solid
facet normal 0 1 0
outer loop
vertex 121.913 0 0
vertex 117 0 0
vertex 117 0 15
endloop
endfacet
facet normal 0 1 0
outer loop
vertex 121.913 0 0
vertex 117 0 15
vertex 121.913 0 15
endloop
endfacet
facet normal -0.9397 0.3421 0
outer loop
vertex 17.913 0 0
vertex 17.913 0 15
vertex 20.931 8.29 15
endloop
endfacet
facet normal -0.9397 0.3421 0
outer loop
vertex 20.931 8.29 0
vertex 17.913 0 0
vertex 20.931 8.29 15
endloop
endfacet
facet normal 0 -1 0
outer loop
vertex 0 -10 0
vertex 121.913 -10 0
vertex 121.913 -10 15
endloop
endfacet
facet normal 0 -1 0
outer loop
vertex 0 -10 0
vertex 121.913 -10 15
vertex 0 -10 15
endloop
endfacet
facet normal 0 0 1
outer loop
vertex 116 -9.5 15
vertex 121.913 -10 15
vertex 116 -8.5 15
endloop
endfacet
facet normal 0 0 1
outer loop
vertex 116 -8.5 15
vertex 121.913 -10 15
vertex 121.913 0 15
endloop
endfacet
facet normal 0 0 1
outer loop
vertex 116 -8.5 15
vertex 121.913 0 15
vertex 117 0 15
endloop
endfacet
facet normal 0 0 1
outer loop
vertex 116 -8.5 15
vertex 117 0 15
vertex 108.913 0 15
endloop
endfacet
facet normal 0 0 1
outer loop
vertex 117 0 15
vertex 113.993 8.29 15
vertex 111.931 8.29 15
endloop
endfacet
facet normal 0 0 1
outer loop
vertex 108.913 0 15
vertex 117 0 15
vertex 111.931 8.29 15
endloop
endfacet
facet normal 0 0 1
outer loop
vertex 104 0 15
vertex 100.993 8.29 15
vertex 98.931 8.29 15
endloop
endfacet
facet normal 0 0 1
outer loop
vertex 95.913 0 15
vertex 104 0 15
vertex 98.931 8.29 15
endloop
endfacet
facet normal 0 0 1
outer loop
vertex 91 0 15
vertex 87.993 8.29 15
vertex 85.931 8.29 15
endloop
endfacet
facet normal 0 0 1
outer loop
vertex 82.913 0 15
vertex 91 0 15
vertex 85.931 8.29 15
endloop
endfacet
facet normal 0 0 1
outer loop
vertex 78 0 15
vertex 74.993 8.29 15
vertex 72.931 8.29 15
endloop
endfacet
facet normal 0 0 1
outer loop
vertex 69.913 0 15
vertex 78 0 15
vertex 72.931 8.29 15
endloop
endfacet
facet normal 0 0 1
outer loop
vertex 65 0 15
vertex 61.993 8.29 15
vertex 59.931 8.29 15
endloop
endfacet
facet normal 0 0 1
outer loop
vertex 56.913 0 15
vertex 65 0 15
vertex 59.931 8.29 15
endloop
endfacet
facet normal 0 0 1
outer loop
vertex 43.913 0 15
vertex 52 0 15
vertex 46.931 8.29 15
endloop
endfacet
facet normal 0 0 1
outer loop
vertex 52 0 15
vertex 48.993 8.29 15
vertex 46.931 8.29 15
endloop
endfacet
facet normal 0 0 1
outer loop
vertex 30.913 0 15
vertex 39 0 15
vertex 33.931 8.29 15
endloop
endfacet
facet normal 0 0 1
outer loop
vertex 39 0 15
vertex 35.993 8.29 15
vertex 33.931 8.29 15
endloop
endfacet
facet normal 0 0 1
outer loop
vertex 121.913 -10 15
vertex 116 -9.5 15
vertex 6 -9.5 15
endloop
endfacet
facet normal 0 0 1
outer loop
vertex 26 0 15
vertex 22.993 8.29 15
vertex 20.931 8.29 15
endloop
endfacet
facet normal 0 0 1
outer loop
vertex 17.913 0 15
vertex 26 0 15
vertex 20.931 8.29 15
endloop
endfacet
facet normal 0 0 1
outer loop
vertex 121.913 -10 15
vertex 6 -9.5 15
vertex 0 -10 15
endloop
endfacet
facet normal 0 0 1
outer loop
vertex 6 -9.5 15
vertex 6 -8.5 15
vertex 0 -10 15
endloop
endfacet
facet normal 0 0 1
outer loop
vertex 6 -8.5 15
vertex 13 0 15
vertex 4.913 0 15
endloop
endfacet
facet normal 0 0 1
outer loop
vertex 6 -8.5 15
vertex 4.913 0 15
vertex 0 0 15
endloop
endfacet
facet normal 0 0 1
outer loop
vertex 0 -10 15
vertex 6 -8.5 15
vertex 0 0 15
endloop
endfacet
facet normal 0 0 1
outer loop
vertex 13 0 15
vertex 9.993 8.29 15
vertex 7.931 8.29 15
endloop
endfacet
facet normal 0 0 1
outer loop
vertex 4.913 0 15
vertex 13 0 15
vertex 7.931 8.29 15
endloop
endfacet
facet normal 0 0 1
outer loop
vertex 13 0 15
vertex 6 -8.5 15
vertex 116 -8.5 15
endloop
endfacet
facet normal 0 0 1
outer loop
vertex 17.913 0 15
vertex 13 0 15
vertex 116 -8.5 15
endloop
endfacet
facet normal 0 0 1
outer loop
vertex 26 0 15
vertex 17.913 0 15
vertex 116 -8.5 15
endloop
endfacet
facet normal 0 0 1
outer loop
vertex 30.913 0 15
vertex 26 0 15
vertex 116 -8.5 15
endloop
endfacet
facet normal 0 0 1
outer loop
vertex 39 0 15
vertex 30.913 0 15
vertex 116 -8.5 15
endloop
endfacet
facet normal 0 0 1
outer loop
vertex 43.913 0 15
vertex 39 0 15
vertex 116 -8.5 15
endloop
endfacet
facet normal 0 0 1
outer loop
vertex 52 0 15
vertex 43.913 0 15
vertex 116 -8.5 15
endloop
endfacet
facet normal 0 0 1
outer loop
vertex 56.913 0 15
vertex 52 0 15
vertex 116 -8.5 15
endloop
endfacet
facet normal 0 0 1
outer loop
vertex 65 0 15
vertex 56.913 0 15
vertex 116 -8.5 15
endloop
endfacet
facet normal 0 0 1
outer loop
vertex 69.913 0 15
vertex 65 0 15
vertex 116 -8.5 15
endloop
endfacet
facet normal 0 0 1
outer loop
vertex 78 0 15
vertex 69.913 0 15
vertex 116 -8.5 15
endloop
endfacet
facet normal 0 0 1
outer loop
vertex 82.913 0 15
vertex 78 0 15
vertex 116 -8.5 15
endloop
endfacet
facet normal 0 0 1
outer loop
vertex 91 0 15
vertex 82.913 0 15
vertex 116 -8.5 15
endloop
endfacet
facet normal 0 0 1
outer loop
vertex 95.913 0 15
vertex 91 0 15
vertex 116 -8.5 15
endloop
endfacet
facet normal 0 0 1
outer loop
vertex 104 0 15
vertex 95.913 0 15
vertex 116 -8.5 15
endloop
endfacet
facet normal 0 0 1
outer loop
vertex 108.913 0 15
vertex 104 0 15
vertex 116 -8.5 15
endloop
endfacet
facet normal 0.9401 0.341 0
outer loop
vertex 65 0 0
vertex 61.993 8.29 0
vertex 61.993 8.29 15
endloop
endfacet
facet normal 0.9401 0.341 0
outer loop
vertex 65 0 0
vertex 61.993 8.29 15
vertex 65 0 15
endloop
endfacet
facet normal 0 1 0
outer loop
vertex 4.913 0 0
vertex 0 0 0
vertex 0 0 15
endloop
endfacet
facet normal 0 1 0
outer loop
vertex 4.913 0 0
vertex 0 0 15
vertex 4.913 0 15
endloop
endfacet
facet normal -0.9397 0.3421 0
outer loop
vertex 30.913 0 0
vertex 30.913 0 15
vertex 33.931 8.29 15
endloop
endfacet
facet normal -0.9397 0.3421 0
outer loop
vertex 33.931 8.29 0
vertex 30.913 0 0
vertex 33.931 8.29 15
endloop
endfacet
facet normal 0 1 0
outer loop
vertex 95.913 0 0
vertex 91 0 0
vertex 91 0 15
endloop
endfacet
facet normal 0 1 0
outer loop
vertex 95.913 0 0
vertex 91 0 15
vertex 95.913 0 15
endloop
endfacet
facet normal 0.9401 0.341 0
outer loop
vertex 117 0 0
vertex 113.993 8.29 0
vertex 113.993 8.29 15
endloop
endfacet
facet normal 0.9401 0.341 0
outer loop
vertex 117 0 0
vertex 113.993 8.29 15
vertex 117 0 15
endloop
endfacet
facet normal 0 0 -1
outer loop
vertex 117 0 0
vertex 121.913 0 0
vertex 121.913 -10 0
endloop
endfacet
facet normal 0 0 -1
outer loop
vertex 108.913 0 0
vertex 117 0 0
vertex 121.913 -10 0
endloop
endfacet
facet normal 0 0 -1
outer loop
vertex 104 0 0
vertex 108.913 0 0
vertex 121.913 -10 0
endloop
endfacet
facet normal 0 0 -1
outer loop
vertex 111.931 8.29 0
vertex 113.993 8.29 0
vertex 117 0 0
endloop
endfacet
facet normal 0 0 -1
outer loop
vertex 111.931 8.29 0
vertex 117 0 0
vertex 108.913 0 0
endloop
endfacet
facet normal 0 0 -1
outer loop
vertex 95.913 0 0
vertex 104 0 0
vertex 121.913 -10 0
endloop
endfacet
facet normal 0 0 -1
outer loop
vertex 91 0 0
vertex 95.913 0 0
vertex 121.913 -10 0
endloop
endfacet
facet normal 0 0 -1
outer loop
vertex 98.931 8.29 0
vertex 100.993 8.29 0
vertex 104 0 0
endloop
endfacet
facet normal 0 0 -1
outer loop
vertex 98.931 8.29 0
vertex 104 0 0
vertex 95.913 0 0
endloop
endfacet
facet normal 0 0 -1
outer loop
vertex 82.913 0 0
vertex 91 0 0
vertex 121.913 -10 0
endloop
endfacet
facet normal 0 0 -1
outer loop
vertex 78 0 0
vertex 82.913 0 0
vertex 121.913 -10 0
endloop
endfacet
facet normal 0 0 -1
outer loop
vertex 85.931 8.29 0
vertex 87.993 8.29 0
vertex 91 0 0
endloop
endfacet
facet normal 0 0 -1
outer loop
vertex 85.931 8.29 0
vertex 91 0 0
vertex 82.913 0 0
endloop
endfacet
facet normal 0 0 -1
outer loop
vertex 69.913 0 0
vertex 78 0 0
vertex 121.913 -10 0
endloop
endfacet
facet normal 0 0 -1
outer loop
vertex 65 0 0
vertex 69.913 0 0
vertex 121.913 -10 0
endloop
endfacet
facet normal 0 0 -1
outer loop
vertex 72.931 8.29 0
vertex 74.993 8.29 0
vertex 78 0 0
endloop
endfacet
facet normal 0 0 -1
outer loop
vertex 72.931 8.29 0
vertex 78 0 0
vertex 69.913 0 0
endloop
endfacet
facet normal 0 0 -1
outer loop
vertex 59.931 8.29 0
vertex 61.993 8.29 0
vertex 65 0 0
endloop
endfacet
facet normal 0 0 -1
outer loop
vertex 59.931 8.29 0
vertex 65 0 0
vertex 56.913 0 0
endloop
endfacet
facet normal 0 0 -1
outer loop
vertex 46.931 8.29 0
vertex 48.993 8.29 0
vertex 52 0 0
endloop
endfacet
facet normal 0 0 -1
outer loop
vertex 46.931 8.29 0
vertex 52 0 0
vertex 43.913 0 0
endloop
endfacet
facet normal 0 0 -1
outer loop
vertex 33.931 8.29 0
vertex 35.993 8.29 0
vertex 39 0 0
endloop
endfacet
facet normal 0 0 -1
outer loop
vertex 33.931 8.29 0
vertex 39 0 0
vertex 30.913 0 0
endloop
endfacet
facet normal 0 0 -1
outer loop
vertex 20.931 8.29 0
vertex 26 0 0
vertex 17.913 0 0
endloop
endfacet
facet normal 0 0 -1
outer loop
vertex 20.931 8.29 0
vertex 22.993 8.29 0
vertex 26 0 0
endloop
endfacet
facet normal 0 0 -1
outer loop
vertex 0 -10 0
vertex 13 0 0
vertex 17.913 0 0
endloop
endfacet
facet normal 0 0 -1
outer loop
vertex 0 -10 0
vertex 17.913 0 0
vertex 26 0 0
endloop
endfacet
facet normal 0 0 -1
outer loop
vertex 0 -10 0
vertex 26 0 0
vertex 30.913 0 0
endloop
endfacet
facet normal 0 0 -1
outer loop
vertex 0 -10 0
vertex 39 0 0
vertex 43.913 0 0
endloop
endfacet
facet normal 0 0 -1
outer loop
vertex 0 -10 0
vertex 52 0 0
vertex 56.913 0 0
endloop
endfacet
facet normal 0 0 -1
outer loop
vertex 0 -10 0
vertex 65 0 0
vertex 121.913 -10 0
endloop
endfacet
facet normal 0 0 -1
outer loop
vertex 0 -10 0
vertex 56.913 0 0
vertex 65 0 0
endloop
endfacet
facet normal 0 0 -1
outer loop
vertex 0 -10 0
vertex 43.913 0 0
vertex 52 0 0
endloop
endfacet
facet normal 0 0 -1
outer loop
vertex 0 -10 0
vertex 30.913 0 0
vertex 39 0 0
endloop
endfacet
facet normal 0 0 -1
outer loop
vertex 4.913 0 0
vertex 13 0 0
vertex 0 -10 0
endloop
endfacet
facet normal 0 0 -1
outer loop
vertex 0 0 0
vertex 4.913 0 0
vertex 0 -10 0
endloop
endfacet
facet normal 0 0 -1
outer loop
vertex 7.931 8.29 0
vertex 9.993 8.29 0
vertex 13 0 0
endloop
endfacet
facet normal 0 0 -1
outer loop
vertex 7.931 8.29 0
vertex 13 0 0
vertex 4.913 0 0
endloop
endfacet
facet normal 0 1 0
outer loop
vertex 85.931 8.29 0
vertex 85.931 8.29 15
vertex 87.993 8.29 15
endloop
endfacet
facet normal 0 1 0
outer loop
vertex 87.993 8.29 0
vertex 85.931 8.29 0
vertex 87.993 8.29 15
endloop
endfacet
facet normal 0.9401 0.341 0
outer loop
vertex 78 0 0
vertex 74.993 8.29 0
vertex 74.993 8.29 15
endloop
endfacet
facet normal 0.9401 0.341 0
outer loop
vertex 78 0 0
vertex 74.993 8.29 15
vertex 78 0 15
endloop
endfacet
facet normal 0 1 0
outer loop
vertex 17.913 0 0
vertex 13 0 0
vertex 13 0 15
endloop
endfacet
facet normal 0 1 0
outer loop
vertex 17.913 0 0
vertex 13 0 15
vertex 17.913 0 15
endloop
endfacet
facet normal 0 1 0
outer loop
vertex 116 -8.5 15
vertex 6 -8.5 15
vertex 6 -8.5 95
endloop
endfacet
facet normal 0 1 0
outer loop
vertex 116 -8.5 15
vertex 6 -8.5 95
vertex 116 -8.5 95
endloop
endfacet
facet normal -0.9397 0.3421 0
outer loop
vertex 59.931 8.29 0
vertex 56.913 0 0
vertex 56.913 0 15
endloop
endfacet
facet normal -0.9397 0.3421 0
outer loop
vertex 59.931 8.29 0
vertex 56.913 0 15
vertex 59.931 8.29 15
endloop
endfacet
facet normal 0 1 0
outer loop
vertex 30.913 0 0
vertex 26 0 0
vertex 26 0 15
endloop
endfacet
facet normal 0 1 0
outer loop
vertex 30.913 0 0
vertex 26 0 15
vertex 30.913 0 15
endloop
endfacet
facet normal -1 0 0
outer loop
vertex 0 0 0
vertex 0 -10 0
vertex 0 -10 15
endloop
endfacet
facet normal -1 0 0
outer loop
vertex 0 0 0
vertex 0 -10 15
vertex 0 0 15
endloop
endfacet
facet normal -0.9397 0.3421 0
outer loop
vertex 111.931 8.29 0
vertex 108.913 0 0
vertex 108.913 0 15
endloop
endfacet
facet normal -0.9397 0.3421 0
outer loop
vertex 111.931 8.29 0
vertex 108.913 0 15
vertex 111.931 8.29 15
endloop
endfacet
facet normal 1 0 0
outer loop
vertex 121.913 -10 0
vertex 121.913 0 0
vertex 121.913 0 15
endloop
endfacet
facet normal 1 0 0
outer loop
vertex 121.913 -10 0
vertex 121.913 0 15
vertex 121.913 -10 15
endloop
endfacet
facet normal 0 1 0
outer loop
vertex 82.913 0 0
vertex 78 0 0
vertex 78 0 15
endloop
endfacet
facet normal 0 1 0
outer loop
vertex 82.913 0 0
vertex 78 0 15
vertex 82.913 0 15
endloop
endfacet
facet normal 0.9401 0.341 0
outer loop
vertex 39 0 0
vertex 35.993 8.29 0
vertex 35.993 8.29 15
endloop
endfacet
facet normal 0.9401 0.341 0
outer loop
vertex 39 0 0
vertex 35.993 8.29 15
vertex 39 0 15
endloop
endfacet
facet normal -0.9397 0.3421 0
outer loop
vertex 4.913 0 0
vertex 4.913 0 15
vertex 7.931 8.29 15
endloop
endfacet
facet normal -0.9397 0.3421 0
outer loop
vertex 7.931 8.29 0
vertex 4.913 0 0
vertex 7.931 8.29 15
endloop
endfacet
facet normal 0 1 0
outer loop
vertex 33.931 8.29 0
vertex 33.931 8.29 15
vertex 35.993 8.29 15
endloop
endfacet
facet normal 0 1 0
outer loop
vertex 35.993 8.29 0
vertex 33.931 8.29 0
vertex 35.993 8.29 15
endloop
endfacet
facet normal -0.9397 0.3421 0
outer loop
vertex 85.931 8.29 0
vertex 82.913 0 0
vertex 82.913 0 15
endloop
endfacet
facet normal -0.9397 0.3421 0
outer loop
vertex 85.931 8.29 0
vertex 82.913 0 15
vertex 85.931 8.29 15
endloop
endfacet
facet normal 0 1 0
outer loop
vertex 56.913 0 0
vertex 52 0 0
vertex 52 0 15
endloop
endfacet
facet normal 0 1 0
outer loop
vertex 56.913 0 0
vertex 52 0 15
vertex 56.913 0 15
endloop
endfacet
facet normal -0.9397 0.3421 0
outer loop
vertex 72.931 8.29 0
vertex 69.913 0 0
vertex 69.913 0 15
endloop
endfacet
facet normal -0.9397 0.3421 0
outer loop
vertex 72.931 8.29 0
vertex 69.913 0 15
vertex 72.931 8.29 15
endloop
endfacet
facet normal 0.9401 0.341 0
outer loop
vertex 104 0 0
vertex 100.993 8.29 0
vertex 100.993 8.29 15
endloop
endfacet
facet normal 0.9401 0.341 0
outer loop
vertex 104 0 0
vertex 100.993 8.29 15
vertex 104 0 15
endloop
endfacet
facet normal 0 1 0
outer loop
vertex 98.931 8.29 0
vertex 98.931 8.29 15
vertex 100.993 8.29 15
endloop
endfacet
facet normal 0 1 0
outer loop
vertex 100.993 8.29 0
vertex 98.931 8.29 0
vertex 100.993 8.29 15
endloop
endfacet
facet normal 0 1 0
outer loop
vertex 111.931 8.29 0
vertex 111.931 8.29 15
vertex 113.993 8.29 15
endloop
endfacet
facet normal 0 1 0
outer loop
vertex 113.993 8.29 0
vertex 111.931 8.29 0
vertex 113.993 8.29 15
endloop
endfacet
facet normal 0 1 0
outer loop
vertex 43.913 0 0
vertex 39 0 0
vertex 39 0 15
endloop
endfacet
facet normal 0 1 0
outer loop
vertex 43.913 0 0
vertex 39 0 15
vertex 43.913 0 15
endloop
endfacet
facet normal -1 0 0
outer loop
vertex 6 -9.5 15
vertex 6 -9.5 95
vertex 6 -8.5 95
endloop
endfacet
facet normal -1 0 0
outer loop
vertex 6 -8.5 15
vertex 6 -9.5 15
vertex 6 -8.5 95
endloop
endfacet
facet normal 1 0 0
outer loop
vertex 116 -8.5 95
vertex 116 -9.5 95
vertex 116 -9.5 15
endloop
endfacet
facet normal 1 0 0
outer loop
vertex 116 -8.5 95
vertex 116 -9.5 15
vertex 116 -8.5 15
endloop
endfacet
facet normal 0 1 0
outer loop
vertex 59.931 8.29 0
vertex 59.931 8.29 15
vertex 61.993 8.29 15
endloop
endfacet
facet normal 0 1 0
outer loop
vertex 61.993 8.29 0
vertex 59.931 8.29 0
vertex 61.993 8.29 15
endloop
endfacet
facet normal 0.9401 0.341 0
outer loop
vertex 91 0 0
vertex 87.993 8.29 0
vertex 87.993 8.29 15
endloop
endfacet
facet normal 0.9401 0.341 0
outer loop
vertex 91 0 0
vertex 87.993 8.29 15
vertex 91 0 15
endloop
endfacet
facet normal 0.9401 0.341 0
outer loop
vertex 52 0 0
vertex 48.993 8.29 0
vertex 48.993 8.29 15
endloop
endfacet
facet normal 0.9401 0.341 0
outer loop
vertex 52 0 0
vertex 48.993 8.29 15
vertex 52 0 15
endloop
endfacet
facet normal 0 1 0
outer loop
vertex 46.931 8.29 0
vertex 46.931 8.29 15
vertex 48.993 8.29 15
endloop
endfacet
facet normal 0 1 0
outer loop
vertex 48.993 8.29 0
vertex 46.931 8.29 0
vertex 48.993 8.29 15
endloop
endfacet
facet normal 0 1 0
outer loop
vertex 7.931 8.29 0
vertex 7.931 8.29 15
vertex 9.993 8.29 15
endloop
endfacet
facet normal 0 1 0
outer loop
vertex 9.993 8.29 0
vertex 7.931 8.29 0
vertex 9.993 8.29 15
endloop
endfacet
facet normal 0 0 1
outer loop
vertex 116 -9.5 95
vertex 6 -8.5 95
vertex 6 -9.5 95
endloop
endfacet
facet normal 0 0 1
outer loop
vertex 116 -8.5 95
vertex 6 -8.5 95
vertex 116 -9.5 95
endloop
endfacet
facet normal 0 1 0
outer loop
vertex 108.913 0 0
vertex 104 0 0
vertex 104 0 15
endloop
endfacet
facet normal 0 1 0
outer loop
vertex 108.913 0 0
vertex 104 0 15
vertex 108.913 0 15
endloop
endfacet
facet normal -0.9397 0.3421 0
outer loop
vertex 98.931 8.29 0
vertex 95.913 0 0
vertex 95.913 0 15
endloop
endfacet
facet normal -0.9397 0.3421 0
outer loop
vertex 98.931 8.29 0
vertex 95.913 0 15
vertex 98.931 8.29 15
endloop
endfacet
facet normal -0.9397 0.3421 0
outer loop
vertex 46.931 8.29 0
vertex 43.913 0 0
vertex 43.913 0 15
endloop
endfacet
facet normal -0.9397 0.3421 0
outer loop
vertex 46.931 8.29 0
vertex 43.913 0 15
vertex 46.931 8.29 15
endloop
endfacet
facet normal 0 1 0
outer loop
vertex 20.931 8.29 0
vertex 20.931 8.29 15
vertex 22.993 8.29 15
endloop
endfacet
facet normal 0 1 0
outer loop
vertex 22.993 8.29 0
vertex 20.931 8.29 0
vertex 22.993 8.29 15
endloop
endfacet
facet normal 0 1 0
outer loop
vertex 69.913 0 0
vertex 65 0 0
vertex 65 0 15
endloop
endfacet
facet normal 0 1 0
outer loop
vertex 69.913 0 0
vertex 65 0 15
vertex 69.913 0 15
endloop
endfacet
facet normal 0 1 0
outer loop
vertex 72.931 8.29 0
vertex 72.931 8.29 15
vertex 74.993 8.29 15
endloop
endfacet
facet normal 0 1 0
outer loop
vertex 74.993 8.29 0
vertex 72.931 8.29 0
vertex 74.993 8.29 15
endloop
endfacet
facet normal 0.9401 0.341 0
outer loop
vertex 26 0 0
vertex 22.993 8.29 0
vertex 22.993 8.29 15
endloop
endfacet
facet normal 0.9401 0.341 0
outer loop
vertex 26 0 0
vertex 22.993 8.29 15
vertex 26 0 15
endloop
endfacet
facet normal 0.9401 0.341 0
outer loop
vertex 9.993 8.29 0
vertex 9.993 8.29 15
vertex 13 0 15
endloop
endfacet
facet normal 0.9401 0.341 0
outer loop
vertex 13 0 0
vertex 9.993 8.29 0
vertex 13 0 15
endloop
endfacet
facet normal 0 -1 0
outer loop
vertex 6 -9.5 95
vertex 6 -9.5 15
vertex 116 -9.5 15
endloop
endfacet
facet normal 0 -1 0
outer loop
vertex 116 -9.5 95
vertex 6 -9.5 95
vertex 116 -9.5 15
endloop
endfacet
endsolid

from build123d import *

# Parameters (mm, degrees)
BOSS_EXTRUDE1_DEPTH = 15
SKETCH2_W           = 110
SKETCH2_H           = 1
BOSS_EXTRUDE3_DEPTH = 80


with BuildPart() as part:
    # Sketch1 → Boss-Extrude1 (new body)
    with BuildSketch(Plane.XY):
        Polygon((0, 0), (4.913259174, 0), (7.93055075, 8.289940472), (9.992855173, 8.289940472), (13, 0), (17.913259174, 0), (20.93055075, 8.289940472), (22.992855173, 8.289940472), (26, 0), (30.913259174, 0), (33.93055075, 8.289940472), (35.992855173, 8.289940472), (39, 0), (43.913259174, 0), (46.93055075, 8.289940472), (48.992855173, 8.289940472), (52, 0), (56.913259174, 0), (59.93055075, 8.289940472), (61.992855173, 8.289940472), (65, 0), (69.913259174, 0), (72.93055075, 8.289940472), (74.992855173, 8.289940472), (78, 0), (82.913259174, 0), (85.93055075, 8.289940472), (87.992855173, 8.289940472), (91, 0), (95.913259174, 0), (98.93055075, 8.289940472), (100.992855173, 8.289940472), (104, 0), (108.913259174, 0), (111.93055075, 8.289940472), (113.992855173, 8.289940472), (117, 0), (121.913259174, 0), (121.913259174, -10), (0, -10), align=None)
    extrude(amount=BOSS_EXTRUDE1_DEPTH)

    # Sketch2 → Boss-Extrude3 (add)
    with BuildSketch(Plane.XY.offset(15)):
        with Locations((61, -9)):
            Rectangle(SKETCH2_W, SKETCH2_H)
    extrude(amount=BOSS_EXTRUDE3_DEPTH)


solid = part.part
